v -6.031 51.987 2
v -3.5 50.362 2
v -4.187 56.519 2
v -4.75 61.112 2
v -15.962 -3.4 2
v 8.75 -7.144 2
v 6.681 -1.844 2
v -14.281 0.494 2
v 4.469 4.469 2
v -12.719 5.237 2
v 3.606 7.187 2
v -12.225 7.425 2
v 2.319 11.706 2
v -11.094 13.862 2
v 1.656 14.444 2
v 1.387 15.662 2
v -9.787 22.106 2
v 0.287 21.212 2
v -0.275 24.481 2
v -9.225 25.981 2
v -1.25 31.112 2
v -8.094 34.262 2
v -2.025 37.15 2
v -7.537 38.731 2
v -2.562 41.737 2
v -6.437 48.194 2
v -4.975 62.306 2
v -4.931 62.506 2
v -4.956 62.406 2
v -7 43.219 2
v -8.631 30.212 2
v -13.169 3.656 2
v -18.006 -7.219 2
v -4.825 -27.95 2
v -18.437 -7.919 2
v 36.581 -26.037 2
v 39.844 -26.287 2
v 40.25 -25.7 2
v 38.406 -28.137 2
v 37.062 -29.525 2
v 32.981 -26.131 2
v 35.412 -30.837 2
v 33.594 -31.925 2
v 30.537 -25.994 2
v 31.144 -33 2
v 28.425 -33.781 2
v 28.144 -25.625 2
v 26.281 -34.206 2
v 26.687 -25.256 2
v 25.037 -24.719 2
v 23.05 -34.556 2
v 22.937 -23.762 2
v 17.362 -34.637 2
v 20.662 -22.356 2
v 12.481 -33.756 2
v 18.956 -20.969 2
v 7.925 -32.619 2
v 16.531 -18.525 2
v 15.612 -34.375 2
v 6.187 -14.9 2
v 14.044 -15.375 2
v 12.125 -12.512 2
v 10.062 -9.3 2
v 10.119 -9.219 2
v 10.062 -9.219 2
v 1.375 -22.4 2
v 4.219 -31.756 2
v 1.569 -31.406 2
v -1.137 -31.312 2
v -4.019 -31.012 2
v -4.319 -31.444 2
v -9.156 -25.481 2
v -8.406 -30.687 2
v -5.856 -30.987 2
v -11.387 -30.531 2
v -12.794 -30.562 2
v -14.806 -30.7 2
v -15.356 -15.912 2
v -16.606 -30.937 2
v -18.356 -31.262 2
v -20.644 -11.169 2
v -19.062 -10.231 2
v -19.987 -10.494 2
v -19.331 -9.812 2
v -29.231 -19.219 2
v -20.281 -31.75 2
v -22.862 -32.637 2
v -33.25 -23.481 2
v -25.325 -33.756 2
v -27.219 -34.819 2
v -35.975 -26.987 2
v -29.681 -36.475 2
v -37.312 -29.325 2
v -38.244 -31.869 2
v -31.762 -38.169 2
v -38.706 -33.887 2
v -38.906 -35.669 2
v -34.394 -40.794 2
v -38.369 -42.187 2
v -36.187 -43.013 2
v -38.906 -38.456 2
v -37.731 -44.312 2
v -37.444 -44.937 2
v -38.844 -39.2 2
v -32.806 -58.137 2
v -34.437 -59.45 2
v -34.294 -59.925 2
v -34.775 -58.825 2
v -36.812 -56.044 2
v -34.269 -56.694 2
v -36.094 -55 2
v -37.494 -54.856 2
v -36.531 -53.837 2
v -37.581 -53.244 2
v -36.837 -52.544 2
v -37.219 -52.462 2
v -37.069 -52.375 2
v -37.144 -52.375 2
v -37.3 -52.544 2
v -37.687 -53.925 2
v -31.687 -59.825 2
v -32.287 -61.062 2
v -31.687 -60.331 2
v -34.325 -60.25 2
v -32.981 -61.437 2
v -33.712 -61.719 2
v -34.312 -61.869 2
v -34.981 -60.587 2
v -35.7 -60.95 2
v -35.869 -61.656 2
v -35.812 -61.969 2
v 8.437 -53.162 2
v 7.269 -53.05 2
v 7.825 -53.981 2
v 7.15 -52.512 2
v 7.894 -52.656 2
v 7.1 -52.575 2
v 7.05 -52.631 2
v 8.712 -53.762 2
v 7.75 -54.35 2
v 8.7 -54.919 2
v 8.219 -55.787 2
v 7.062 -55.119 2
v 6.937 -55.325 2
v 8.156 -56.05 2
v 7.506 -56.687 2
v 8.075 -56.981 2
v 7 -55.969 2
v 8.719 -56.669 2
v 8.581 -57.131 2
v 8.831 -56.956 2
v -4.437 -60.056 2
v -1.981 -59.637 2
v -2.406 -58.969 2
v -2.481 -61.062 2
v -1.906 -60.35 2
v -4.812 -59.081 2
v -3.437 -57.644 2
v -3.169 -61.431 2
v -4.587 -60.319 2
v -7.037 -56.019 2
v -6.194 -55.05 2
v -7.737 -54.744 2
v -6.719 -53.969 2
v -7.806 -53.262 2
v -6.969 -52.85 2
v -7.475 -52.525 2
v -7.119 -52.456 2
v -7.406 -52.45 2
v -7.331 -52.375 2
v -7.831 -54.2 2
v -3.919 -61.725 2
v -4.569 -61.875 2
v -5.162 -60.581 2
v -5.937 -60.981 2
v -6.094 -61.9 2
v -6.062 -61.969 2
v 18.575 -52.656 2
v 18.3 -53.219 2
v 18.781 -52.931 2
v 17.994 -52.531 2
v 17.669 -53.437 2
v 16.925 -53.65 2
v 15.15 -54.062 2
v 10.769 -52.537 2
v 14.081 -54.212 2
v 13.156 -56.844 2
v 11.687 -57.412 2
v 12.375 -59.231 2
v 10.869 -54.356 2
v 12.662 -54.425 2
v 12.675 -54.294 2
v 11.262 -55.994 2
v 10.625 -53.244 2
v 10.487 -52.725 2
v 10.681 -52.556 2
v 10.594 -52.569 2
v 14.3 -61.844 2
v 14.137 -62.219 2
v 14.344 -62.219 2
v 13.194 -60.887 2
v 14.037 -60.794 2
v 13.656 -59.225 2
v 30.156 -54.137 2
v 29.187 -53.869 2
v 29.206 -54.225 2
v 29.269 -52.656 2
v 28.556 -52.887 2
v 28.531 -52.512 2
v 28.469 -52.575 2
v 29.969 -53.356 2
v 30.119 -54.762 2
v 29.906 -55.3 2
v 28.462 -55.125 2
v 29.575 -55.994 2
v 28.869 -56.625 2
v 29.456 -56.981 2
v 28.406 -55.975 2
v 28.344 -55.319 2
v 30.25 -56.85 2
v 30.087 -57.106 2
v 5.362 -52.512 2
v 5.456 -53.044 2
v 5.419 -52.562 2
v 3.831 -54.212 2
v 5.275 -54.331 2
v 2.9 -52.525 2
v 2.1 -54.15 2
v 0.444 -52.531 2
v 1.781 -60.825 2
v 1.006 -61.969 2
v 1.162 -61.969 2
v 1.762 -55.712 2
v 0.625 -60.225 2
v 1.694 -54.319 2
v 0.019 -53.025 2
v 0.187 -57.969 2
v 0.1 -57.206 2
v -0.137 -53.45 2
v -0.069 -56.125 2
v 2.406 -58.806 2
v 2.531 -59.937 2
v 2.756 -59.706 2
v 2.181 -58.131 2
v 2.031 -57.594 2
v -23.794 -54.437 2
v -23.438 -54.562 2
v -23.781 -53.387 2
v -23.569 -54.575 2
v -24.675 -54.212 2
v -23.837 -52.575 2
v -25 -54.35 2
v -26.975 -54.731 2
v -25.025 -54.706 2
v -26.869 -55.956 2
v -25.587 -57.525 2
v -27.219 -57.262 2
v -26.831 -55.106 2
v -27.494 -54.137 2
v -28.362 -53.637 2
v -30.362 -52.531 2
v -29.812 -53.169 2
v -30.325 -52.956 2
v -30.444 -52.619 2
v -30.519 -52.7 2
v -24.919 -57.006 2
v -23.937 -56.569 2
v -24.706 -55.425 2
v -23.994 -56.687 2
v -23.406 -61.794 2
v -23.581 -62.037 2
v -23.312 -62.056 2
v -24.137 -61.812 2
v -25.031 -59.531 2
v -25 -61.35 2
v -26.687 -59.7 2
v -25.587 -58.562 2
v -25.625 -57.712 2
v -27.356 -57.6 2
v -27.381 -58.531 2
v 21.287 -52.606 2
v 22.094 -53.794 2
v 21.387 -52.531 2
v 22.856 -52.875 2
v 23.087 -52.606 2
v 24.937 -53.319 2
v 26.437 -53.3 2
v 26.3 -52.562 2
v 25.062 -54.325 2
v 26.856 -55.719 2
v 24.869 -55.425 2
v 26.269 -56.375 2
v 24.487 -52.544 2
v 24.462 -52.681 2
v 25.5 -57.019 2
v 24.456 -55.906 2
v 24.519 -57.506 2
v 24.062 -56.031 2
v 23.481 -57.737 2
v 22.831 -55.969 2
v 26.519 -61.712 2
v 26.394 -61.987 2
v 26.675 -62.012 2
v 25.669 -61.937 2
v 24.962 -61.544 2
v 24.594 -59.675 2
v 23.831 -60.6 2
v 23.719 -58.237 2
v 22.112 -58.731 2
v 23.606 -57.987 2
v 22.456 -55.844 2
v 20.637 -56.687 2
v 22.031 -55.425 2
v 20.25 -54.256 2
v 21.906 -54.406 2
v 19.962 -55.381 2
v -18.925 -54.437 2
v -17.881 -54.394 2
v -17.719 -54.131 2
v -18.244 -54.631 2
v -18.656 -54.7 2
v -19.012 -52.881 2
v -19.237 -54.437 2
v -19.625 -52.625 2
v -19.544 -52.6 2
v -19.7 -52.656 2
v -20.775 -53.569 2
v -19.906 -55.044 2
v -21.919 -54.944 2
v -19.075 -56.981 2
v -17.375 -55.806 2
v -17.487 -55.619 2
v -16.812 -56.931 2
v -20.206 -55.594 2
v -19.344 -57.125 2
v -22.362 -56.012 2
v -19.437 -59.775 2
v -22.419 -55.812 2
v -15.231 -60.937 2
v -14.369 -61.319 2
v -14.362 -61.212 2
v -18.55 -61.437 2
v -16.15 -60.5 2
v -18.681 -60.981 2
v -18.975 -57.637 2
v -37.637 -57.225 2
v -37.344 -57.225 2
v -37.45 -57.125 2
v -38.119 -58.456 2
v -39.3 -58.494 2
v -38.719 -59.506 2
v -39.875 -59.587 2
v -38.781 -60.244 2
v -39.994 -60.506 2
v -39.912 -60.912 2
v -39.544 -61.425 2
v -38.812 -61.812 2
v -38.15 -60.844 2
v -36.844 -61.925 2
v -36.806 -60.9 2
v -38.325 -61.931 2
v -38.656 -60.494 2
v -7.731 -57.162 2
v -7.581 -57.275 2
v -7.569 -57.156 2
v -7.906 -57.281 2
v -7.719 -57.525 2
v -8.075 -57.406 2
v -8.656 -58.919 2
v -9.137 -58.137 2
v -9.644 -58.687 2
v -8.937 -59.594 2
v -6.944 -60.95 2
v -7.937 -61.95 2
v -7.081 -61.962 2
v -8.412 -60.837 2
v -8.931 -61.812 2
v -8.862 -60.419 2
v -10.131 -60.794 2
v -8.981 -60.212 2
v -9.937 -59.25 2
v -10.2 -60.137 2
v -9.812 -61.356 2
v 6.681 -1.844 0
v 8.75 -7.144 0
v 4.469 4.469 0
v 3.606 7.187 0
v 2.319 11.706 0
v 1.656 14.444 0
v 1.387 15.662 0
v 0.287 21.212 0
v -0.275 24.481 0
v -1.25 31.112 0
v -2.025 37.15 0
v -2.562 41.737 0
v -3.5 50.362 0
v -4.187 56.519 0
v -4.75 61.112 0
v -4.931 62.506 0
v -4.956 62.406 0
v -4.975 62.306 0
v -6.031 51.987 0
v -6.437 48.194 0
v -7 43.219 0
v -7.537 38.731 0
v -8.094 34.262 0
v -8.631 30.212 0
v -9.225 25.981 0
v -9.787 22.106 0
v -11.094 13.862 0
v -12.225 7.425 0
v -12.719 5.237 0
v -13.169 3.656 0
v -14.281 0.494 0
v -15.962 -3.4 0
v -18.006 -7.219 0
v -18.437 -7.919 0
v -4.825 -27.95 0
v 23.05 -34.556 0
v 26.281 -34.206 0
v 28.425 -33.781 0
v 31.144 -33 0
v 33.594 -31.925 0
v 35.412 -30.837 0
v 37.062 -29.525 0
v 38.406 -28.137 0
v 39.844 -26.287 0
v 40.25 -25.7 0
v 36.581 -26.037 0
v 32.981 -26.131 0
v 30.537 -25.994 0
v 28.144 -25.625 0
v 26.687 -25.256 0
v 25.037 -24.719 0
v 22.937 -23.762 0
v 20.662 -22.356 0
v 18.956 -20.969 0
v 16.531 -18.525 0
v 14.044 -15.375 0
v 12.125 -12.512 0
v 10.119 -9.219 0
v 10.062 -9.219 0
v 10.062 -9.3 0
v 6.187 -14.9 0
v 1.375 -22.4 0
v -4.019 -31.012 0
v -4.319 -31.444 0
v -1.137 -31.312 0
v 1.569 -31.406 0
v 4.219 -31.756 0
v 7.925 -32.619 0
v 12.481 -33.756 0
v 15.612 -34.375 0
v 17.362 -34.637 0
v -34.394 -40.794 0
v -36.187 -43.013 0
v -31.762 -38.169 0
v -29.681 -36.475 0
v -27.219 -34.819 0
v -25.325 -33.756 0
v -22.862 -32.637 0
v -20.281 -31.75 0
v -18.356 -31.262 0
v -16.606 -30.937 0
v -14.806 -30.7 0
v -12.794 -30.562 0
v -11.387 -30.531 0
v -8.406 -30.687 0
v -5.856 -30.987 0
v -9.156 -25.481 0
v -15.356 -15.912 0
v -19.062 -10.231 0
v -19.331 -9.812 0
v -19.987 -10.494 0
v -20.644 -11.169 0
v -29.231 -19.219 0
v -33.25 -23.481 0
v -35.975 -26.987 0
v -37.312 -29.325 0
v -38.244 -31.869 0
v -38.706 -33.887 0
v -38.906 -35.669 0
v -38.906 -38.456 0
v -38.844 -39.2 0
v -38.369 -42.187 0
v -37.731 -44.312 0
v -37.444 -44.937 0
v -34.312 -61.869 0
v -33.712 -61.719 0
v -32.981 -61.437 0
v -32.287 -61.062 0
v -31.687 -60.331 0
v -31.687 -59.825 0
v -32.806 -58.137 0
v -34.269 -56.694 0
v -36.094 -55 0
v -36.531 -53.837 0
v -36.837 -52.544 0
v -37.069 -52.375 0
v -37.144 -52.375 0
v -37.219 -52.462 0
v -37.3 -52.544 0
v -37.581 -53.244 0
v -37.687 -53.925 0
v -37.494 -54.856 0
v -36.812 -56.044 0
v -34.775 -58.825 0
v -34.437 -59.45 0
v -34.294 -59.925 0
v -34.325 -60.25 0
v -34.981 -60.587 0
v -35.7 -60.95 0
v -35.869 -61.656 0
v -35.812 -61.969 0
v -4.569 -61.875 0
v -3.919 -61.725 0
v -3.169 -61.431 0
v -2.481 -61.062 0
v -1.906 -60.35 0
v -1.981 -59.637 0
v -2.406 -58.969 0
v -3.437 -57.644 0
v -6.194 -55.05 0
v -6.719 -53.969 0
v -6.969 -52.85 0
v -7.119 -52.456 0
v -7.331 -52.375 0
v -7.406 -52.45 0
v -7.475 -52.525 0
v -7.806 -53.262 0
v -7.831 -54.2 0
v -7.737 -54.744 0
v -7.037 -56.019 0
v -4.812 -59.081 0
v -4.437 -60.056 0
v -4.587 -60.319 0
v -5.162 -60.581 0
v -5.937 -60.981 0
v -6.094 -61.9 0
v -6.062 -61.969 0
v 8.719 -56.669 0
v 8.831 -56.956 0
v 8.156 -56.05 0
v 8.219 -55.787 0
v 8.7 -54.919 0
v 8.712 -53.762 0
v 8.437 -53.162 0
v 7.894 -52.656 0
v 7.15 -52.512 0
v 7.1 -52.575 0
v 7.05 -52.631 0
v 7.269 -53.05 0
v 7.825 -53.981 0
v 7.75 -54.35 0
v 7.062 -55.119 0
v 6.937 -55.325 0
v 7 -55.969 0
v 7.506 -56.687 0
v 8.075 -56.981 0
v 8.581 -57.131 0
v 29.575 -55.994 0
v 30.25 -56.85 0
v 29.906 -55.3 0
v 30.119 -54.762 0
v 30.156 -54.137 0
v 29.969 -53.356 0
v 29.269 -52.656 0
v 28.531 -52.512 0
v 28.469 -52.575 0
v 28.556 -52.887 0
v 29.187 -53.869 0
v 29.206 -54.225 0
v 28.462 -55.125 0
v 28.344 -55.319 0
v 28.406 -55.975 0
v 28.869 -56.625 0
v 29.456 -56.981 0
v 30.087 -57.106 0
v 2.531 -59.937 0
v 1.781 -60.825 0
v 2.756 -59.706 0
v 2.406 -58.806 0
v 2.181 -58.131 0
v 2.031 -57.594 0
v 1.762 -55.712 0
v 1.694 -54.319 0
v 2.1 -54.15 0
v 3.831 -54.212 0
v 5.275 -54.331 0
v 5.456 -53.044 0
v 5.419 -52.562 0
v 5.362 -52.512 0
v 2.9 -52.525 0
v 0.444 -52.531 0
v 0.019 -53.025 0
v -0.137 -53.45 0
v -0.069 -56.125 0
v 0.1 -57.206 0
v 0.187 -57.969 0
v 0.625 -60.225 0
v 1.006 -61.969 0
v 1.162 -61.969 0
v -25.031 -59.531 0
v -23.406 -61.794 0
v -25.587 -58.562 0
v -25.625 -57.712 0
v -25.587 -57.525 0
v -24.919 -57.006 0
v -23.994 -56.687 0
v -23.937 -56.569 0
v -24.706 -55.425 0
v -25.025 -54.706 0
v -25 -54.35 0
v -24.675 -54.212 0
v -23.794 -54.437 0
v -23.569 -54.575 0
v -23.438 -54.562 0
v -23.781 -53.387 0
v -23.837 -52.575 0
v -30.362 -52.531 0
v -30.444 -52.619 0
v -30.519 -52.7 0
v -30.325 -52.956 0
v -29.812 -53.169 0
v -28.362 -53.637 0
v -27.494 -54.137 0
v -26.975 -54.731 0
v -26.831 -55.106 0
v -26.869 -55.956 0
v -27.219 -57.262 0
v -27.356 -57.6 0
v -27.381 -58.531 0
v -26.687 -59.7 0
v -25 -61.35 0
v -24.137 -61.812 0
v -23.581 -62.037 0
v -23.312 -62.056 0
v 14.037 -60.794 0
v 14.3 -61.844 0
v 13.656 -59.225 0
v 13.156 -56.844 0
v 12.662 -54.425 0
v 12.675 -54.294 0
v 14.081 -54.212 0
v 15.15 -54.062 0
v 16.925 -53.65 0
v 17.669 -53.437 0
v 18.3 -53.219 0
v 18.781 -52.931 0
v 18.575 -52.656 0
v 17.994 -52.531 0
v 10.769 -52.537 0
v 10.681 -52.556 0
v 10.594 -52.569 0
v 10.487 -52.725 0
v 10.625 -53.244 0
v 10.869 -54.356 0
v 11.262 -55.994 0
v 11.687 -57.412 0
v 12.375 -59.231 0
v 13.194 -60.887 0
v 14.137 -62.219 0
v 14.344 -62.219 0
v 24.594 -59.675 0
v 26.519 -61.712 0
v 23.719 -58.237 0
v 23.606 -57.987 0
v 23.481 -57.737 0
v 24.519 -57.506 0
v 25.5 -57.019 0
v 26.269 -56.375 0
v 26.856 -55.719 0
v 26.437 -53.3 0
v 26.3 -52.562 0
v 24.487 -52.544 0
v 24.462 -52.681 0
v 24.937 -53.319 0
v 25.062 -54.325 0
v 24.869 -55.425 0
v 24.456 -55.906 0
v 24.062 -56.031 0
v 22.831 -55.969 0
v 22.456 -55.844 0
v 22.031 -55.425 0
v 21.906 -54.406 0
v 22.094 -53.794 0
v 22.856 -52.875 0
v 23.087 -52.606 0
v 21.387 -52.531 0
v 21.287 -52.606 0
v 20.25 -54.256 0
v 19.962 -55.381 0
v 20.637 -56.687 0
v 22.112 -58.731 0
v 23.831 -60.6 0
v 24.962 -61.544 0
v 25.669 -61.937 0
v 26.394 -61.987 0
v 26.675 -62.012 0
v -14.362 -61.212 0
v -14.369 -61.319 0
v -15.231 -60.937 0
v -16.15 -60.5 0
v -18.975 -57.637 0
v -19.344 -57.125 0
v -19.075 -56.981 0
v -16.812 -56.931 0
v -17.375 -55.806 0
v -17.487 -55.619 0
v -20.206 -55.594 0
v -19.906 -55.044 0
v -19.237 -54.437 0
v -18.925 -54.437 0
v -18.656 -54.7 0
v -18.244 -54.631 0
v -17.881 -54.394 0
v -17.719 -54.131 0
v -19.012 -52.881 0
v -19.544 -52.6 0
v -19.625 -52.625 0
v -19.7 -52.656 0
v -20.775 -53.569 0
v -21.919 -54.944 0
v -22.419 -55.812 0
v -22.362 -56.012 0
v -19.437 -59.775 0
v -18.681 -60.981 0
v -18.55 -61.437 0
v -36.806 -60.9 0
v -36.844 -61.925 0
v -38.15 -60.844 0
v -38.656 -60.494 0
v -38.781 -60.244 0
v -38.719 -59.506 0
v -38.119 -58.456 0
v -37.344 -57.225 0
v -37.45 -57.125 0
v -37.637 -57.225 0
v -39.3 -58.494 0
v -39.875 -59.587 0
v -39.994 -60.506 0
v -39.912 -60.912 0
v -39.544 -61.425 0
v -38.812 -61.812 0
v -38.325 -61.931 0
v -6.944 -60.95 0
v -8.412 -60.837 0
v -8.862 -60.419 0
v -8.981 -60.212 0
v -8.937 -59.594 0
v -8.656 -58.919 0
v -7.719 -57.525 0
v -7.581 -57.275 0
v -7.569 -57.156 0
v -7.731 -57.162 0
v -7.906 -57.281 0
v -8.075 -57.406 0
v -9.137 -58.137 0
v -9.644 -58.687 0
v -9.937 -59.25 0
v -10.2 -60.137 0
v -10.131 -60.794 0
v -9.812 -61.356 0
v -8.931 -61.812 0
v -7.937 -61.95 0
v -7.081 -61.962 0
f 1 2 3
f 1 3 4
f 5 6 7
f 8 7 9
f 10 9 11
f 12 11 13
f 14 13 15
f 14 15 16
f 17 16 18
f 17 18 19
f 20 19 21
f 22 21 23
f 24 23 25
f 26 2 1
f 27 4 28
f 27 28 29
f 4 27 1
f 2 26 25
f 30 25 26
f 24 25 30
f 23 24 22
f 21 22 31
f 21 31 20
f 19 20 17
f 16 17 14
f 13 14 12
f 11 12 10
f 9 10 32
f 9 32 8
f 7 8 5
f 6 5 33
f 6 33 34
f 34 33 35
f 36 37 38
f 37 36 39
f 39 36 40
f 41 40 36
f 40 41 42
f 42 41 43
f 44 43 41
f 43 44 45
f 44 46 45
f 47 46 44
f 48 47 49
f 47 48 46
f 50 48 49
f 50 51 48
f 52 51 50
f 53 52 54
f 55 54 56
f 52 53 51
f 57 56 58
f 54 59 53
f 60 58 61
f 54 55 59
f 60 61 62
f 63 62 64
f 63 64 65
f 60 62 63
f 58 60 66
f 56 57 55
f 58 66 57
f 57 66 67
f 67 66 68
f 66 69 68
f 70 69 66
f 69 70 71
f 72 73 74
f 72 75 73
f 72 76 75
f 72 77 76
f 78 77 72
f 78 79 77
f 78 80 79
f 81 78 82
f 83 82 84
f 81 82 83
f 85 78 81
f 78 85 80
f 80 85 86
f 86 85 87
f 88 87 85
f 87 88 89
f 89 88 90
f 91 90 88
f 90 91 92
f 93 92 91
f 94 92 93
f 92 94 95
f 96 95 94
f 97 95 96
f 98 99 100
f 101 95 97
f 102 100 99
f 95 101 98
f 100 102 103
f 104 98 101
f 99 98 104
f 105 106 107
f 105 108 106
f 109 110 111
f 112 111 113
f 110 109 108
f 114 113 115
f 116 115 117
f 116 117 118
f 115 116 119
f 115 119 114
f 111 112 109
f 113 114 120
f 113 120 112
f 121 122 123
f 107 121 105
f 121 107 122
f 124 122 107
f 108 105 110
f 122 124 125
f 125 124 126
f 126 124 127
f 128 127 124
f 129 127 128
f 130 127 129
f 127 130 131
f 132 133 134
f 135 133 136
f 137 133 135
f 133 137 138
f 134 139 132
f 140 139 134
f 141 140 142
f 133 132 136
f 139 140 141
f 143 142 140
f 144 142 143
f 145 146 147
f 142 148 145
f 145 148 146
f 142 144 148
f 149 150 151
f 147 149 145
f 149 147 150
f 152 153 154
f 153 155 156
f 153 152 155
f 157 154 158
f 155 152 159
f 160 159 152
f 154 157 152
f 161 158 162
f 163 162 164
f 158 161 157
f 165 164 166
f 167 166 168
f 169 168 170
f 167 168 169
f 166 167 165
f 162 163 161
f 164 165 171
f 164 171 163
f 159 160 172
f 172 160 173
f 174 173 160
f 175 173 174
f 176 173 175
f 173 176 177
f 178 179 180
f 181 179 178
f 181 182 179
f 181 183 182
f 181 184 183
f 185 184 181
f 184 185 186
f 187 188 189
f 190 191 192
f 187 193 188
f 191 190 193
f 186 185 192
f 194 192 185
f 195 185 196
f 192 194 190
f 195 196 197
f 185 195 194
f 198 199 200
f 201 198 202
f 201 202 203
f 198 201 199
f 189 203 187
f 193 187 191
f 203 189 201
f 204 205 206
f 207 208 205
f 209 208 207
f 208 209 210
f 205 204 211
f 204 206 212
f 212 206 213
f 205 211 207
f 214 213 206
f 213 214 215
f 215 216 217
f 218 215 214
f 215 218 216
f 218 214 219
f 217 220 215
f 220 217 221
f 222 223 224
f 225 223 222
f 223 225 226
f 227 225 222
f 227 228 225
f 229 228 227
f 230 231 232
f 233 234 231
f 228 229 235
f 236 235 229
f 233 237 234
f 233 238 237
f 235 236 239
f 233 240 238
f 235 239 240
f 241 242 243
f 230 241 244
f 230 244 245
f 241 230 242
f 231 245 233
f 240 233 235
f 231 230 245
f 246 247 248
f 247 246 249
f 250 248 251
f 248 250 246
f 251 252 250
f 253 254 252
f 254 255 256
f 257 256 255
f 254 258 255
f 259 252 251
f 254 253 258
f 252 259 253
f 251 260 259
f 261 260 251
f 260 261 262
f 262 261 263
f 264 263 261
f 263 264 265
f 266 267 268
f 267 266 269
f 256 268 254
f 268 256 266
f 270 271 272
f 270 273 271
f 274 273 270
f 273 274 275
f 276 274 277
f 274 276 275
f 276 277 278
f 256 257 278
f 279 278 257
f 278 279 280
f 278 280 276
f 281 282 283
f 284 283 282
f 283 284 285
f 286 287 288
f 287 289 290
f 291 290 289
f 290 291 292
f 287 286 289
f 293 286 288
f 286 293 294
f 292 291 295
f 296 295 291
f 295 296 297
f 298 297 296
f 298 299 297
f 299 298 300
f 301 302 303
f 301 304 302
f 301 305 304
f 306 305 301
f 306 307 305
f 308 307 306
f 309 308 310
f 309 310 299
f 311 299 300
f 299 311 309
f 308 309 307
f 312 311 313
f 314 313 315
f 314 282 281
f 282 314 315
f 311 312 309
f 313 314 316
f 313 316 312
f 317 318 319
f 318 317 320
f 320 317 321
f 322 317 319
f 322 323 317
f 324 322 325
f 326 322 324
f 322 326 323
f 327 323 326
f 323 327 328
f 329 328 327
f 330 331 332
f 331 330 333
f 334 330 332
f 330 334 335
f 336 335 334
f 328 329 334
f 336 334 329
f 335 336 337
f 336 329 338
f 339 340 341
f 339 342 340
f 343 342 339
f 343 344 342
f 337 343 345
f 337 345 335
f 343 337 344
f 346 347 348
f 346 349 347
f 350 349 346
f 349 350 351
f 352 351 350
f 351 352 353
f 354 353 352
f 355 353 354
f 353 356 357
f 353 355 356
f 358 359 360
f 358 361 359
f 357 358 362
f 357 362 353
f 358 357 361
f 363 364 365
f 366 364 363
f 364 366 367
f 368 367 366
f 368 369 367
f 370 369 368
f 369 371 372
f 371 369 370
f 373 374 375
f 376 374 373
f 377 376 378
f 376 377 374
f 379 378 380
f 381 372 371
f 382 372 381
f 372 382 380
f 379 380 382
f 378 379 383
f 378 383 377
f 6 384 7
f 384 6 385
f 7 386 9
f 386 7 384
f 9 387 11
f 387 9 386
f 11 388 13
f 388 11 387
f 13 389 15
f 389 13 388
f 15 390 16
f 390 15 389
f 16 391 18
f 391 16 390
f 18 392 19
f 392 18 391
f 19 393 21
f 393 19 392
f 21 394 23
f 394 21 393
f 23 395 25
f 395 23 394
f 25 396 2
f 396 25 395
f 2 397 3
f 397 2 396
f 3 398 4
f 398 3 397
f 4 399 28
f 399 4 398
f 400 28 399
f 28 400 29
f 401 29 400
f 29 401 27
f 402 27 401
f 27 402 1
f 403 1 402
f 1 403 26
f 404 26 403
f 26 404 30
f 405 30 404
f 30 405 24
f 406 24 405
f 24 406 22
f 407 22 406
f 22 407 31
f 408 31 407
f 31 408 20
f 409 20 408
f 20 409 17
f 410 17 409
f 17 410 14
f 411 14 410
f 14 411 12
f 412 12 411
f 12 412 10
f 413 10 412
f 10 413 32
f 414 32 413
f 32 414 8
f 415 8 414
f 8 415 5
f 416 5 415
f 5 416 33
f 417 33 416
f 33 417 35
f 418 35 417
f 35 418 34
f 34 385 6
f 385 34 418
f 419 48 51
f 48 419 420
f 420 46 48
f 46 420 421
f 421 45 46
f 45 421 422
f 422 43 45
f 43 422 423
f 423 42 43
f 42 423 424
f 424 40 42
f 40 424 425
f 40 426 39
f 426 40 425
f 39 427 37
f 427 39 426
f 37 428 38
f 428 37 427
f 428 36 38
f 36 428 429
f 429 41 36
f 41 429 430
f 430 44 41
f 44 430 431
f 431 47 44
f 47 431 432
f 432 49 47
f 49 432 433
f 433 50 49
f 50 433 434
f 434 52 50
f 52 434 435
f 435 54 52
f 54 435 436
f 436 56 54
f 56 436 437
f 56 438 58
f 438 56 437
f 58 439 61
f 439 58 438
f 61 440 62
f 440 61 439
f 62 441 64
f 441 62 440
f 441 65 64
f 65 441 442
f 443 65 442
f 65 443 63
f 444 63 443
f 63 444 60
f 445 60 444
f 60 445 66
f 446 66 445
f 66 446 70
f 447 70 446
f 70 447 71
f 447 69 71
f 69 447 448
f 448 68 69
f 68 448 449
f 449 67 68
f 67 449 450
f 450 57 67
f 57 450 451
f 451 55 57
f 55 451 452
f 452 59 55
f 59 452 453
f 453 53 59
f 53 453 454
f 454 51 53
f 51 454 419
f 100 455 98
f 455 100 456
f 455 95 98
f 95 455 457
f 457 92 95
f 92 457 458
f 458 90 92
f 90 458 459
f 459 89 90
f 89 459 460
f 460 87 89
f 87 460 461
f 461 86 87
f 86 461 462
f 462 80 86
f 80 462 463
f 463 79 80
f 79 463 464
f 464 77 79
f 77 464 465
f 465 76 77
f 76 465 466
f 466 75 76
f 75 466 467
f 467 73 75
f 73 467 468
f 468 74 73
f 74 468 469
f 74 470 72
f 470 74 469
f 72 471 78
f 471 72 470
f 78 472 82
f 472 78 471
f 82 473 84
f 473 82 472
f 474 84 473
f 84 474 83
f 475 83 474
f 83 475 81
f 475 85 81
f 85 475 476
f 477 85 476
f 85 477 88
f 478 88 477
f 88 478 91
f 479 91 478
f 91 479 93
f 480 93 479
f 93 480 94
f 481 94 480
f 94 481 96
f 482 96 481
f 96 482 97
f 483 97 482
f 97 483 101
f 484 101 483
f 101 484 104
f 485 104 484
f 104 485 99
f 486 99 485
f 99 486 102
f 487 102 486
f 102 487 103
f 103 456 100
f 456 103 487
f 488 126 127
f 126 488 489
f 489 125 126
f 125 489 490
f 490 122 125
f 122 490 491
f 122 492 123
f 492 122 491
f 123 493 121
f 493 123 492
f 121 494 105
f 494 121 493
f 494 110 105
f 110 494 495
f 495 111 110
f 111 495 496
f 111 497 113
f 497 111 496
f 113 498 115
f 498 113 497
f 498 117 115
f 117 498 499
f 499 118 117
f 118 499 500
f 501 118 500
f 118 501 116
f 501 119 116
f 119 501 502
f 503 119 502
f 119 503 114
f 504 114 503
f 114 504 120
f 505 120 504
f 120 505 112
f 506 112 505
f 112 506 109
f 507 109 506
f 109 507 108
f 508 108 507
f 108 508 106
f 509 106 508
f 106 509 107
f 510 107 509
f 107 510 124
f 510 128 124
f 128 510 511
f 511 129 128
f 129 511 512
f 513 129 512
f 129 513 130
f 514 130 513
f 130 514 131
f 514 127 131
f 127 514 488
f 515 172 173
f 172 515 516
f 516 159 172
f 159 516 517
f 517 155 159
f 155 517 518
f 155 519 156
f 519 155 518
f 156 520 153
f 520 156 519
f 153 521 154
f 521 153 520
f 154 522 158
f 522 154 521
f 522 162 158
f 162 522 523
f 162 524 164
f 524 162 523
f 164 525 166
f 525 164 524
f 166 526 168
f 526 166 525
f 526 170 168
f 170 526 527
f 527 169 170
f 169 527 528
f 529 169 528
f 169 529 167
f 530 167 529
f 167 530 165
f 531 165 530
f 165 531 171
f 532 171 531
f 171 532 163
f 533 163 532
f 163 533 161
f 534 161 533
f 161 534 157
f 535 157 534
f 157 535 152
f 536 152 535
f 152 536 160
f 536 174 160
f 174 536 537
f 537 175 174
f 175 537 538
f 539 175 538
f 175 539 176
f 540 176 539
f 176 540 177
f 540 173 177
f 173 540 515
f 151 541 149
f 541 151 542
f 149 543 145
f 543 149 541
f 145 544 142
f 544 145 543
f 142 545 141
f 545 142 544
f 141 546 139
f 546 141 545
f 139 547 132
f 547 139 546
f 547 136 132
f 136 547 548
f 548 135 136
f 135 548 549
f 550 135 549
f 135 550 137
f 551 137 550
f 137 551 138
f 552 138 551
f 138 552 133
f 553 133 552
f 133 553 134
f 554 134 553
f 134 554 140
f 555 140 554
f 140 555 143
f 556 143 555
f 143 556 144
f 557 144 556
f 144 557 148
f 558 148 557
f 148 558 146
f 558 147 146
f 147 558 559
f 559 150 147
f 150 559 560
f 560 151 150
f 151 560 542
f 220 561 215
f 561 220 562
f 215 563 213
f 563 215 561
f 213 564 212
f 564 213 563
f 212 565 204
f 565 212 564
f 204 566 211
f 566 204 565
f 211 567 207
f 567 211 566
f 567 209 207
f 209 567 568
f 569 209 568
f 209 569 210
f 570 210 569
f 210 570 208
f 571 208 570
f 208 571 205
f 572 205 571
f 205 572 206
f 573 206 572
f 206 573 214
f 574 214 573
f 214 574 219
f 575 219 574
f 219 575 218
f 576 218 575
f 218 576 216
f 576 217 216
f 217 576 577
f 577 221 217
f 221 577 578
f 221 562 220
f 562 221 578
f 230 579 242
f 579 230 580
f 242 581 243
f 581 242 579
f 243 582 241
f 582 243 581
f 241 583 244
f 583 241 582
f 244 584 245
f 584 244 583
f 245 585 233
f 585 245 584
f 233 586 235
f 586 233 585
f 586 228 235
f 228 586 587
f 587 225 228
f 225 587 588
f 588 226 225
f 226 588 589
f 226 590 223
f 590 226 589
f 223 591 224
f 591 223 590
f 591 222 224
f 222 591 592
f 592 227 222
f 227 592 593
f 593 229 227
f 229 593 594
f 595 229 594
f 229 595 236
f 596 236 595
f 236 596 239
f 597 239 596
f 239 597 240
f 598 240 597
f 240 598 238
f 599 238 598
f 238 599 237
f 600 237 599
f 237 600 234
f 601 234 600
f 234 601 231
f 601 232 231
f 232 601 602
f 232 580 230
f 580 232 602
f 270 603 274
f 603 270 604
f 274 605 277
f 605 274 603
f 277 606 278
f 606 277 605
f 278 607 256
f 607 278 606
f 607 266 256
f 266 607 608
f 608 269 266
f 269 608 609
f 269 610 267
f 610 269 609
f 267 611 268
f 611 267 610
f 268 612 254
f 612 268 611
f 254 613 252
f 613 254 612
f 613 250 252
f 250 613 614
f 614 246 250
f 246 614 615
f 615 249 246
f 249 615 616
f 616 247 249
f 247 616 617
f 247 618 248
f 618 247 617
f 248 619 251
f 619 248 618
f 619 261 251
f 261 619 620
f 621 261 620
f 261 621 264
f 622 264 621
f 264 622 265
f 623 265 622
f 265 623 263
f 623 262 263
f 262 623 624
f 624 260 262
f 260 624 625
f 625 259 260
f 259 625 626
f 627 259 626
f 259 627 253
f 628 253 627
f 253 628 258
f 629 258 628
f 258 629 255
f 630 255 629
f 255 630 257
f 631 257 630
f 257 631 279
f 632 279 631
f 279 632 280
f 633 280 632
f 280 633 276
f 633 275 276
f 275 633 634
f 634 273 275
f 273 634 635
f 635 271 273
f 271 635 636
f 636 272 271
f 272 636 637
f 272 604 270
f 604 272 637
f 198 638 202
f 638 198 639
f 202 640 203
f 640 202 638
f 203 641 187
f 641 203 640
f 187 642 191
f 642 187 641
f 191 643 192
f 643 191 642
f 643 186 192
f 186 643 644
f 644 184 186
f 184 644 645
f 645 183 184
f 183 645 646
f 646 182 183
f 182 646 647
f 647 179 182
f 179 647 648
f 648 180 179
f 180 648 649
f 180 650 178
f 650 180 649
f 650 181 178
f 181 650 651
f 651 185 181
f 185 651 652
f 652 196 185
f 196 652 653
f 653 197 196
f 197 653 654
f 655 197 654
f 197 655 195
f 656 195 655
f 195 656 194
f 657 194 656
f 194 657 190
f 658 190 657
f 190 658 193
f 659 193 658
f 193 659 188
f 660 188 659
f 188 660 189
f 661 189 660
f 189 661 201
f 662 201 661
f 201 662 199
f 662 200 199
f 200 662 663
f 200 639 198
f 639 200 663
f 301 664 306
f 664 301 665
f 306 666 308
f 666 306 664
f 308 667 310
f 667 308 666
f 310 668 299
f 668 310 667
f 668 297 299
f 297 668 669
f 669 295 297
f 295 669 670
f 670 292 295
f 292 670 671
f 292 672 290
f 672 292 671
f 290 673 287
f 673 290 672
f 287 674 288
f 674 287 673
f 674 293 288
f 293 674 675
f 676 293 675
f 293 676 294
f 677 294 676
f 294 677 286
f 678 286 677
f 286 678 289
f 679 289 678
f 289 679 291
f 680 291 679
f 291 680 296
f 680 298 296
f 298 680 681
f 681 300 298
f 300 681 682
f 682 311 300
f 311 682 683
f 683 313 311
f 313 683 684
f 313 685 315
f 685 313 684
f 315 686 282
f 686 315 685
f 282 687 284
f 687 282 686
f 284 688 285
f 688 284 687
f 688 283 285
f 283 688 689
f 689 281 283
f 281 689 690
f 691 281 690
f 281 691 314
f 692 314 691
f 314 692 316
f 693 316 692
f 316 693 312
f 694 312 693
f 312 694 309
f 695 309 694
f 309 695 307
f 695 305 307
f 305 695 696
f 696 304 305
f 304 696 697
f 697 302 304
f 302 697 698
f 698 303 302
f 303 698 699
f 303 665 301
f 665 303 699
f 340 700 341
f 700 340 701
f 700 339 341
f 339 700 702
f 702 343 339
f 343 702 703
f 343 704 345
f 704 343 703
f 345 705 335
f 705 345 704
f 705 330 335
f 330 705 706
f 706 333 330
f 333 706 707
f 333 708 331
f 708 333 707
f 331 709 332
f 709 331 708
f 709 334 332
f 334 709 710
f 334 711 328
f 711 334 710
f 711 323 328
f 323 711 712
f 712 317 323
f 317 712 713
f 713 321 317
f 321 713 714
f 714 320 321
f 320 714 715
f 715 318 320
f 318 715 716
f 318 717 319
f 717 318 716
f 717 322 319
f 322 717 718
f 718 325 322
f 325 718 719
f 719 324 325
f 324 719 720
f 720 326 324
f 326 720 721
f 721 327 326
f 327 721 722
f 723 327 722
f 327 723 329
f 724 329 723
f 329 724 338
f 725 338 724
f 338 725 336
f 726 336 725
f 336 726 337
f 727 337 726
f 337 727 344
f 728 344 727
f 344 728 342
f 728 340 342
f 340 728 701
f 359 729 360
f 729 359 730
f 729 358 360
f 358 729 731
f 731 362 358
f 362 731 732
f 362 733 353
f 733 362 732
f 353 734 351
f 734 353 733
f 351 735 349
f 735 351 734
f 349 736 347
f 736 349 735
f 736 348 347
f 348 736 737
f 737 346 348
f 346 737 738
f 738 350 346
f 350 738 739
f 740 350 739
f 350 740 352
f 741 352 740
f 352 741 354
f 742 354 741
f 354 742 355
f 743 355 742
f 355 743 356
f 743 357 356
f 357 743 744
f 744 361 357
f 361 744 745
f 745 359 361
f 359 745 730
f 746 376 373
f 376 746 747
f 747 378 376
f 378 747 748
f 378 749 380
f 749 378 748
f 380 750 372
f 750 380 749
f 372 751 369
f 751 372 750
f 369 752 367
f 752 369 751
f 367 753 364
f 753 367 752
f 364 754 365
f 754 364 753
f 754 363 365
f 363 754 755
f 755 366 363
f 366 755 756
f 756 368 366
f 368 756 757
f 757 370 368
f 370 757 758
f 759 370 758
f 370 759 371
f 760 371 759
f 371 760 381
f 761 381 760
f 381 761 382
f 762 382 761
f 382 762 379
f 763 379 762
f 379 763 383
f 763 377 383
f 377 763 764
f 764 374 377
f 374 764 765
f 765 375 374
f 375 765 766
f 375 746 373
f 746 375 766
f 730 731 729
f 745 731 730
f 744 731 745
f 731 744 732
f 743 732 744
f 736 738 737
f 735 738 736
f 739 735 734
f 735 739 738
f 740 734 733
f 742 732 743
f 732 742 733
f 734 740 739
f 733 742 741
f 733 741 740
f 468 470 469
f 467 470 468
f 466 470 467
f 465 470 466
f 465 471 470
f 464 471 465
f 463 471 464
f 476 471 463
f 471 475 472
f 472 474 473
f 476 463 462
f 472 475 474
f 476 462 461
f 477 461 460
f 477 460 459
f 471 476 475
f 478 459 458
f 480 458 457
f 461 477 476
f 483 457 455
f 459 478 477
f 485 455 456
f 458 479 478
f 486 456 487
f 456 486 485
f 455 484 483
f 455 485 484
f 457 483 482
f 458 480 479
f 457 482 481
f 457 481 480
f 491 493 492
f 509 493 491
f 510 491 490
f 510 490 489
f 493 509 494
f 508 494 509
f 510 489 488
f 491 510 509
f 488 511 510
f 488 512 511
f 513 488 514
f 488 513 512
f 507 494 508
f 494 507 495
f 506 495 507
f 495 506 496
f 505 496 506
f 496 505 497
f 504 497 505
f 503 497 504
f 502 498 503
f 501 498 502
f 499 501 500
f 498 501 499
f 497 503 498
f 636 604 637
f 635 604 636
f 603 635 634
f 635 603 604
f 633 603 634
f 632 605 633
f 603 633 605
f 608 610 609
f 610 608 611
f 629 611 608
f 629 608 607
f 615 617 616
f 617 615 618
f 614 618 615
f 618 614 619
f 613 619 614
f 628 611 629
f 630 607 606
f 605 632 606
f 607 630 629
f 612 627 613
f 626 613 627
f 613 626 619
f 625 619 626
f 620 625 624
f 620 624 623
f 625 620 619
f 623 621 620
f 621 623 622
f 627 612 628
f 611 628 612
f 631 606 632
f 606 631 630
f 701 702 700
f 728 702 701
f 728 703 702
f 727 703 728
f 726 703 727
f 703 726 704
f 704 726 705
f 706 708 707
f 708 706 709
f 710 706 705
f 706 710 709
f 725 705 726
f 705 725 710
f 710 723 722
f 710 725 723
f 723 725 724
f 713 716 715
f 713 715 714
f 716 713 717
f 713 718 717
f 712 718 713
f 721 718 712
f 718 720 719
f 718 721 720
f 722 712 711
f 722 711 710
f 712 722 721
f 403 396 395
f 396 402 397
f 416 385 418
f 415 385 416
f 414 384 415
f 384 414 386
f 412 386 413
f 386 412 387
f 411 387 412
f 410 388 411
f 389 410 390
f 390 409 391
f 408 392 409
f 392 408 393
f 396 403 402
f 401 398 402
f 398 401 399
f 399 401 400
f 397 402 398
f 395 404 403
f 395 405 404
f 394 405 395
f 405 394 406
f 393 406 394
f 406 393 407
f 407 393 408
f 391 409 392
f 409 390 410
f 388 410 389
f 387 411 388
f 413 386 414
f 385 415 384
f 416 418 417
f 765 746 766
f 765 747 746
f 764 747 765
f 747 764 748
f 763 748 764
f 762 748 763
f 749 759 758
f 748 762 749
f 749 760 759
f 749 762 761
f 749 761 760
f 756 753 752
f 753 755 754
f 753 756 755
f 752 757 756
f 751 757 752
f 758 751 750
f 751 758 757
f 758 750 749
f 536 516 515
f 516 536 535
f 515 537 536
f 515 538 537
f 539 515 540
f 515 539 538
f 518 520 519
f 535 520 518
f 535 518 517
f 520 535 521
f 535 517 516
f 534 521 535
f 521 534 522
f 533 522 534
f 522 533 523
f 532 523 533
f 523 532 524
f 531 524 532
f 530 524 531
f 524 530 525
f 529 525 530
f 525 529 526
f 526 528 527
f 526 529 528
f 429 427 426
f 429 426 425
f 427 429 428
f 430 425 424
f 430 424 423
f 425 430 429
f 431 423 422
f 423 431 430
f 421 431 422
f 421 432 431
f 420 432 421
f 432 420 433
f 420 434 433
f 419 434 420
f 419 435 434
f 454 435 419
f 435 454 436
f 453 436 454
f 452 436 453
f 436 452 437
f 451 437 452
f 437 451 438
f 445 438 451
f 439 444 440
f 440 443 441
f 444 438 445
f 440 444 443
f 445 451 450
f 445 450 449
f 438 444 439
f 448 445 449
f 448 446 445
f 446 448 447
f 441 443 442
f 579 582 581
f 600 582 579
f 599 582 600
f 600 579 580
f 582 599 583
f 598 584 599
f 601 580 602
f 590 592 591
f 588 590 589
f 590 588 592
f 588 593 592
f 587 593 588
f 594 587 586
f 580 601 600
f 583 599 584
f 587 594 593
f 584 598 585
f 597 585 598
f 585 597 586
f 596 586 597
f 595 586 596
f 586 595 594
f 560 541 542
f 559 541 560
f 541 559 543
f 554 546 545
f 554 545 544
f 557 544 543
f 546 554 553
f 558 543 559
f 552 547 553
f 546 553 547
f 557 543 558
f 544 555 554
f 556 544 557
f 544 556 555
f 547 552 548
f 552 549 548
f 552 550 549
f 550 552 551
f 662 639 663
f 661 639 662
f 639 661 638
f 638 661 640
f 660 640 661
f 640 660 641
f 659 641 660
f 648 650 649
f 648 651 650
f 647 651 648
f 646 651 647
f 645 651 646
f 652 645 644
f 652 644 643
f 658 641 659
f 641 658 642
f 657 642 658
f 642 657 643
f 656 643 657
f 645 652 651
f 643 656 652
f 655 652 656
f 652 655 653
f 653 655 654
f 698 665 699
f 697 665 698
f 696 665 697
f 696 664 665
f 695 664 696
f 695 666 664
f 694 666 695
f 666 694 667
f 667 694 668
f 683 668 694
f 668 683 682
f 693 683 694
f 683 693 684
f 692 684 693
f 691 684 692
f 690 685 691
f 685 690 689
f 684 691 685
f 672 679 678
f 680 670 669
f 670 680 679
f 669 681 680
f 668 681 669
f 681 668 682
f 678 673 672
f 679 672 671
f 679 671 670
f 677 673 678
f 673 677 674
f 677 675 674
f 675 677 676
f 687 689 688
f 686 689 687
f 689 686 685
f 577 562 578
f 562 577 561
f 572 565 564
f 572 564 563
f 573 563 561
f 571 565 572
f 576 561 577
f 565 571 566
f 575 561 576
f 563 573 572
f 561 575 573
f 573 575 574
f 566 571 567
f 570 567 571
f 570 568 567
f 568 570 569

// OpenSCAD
module 545fae62030558136c1f7b69fdbd8442_1()
{
 /* Generated by trace2scad version 20150415
    http://aggregate.org/MAKE/TRACE2SCAD/
    Optimized model has 387/4796 original points
 */
 color([0.48, 0.48, 0.48])
 assign(minx=0) /* polygon minx=39 */
 assign(miny=0) /* polygon miny=45 */
 assign(maxx=12880) /* polygon maxx=12880 */
 assign(maxy=20000) /* polygon maxy=20001 */
 assign(dx=maxx-minx)
 assign(dy=maxy-miny)
 assign(maxd=((dx>dy)?dx:dy))
 scale([1/maxd, 1/maxd, 1])
 translate([-minx-dx/2, -miny-dy/2, 0])
 linear_extrude(height=1, convexity=387)
 union() {
  union() {
   polygon([[5647,19985],[5644,19969],[5475,18318],[5410,17711],[5320,16915],[5234,16197],[5145,15482],[5059,14834],[4964,14157],[4874,13537],[4665,12218],[4484,11188],[4405,10838],[4333,10585],[4155,10079],[3886,9456],[3559,8845],[3490,8733],[5668,5528],[7840,8857],[7509,9705],[7155,10715],[7017,11150],[6811,11873],[6705,12311],[6662,12506],[6486,13394],[6396,13917],[6240,14978],[6116,15944],[6030,16678],[5880,18058],[5770,19043],[5680,19778],[5651,20001]], convexity=6);
   polygon([[8050,8518],[8050,8512],[7430,7616],[6660,6416],[5797,5038],[5749,4969],[6258,4990],[6691,4975],[7115,4919],[7708,4781],[8437,4599],[8938,4500],[9218,4458],[10128,4471],[10645,4527],[10988,4595],[11423,4720],[11815,4892],[12106,5066],[12370,5276],[12585,5498],[12815,5794],[12880,5888],[12293,5834],[11717,5819],[11326,5841],[10943,5900],[10710,5959],[10446,6045],[10110,6198],[9746,6423],[9473,6645],[9085,7036],[8687,7540],[8380,7998],[8059,8525],[8050,8525]], convexity=9);
   polygon([[3242,8321],[3137,8213],[1763,6925],[1120,6243],[684,5682],[470,5308],[321,4901],[247,4578],[215,4293],[215,3847],[225,3728],[301,3250],[403,2910],[449,2810],[650,3118],[937,3473],[1358,3893],[1691,4164],[2085,4429],[2388,4599],[2782,4778],[3195,4920],[3503,4998],[3783,5050],[4071,5088],[4393,5110],[4618,5115],[5095,5090],[5503,5042],[4975,5923],[3983,7454],[3390,8363],[3347,8430]], convexity=7);
   polygon([[485,1606],[472,1593],[427,1481],[410,1372],[441,1223],[550,1033],[876,588],[930,488],[953,412],[948,360],[843,306],[728,248],[701,135],[710,85],[950,101],[1046,125],[1163,170],[1274,230],[1370,347],[1370,428],[1191,698],[957,929],[665,1200],[595,1386],[546,1593],[509,1620],[497,1620]], convexity=8);
   polygon([[5255,1608],[5244,1596],[5191,1478],[5187,1328],[5202,1241],[5314,1037],[5670,547],[5730,391],[5706,349],[5614,307],[5490,243],[5465,96],[5470,85],[5709,100],[5813,124],[5933,171],[6043,230],[6135,344],[6123,458],[6055,565],[5890,777],[5449,1192],[5365,1365],[5325,1544],[5301,1607],[5267,1620]], convexity=8);
   polygon([[6904,1596],[6511,1595],[6443,1516],[6418,1448],[6429,1020],[6456,847],[6470,725],[6540,364],[6601,85],[6626,85],[6725,268],[6845,410],[6881,447],[6825,591],[6789,699],[6765,785],[6722,1086],[6711,1309],[6776,1336],[7053,1326],[7284,1307],[7313,1513],[7307,1590],[7298,1598]], convexity=10);
   polygon([[7576,1588],[7568,1579],[7603,1512],[7692,1363],[7680,1304],[7570,1181],[7550,1148],[7560,1045],[7641,930],[7732,883],[7813,859],[7853,887],[7835,933],[7745,1032],[7755,1074],[7832,1213],[7834,1398],[7790,1494],[7703,1575],[7584,1598]], convexity=10);
   polygon([[11000,1593],[10995,1588],[11009,1538],[11110,1381],[11113,1324],[10994,1180],[10975,1149],[10985,1044],[11059,940],[11153,883],[11254,863],[11280,904],[11172,1041],[11225,1152],[11259,1238],[11265,1338],[11235,1463],[11123,1575],[11005,1598]], convexity=10);
   polygon([[1569,1581],[1557,1568],[1588,1527],[1670,1493],[1902,1418],[2041,1338],[2124,1243],[2147,1183],[2141,1047],[2085,838],[2063,784],[2059,635],[2170,448],[2440,184],[2578,110],[2667,74],[2710,71],[2695,113],[2435,475],[2346,630],[2340,766],[2346,796],[2453,879],[2601,930],[2610,949],[2487,1132],[2436,1247],[2440,1304],[2492,1326],[2633,1290],[2669,1268],[2690,1270],[2635,1458],[2626,1588],[1582,1595]], convexity=13);
   polygon([[8149,1591],[8135,1589],[8118,1564],[8140,1481],[8179,1303],[8242,1041],[8310,814],[8420,523],[8551,258],[8702,45],[8735,45],[8728,105],[8686,273],[8625,524],[8545,905],[8466,1292],[8468,1313],[8693,1326],[8864,1350],[9148,1416],[9267,1450],[9368,1485],[9445,1531],[9412,1575],[9319,1595],[8163,1594]], convexity=9);
   polygon([[9854,1589],[9846,1583],[9680,1319],[9634,1139],[9742,930],[9978,603],[10253,304],[10434,153],[10547,90],[10663,82],[10708,78],[10683,126],[10375,452],[10235,682],[10217,722],[10197,762],[10363,799],[10520,877],[10643,980],[10737,1085],[10670,1472],[10648,1590],[10358,1593],[10354,1571],[10430,1469],[10450,1308],[10419,1132],[10353,1055],[10290,1035],[10093,1045],[10033,1065],[9965,1132],[9945,1295],[9975,1393],[10097,1540],[10134,1583],[9862,1595]], convexity=13);
   polygon([[3300,1580],[3288,1575],[3116,1429],[2933,1209],[2853,1070],[2862,1038],[3330,436],[3451,243],[3472,170],[4141,189],[4142,206],[4003,250],[3856,320],[3404,778],[3345,860],[3388,883],[3750,891],[3660,1071],[3642,1101],[3207,1105],[3255,1193],[3362,1290],[3412,1290],[3455,1248],[3521,1259],[3579,1297],[3605,1339],[3398,1539],[3313,1584]], convexity=12);
   polygon([[433,852],[418,844],[152,641],[60,466],[41,319],[54,254],[113,172],[230,110],[308,91],[545,92],[551,256],[336,265],[255,321],[235,361],[245,479],[341,647],[465,844],[448,860]], convexity=8);
   polygon([[5175,835],[5148,815],[4978,698],[4897,610],[4850,520],[4808,378],[4819,273],[4870,183],[5011,110],[5170,88],[5307,86],[5329,248],[5094,266],[5022,333],[5003,366],[5010,465],[5055,573],[5205,796],[5227,836],[5229,855],[5203,854]], convexity=8);
  }
 }
}

module 545fae62030558136c1f7b69fdbd8442()
{
 /* all layers combined, scaled to within a 1mm cube */
 scale([1, 1, 1/1])
 difference() {
  union() {
   scale([1,1,2]) translate([0,0,-0.5]) 545fae62030558136c1f7b69fdbd8442_1();
  }
  translate([0,0,-2]) cube([2,2,4],center=true);
 }
}

scale([125, 125, 2]) {
	545fae62030558136c1f7b69fdbd8442();
}
